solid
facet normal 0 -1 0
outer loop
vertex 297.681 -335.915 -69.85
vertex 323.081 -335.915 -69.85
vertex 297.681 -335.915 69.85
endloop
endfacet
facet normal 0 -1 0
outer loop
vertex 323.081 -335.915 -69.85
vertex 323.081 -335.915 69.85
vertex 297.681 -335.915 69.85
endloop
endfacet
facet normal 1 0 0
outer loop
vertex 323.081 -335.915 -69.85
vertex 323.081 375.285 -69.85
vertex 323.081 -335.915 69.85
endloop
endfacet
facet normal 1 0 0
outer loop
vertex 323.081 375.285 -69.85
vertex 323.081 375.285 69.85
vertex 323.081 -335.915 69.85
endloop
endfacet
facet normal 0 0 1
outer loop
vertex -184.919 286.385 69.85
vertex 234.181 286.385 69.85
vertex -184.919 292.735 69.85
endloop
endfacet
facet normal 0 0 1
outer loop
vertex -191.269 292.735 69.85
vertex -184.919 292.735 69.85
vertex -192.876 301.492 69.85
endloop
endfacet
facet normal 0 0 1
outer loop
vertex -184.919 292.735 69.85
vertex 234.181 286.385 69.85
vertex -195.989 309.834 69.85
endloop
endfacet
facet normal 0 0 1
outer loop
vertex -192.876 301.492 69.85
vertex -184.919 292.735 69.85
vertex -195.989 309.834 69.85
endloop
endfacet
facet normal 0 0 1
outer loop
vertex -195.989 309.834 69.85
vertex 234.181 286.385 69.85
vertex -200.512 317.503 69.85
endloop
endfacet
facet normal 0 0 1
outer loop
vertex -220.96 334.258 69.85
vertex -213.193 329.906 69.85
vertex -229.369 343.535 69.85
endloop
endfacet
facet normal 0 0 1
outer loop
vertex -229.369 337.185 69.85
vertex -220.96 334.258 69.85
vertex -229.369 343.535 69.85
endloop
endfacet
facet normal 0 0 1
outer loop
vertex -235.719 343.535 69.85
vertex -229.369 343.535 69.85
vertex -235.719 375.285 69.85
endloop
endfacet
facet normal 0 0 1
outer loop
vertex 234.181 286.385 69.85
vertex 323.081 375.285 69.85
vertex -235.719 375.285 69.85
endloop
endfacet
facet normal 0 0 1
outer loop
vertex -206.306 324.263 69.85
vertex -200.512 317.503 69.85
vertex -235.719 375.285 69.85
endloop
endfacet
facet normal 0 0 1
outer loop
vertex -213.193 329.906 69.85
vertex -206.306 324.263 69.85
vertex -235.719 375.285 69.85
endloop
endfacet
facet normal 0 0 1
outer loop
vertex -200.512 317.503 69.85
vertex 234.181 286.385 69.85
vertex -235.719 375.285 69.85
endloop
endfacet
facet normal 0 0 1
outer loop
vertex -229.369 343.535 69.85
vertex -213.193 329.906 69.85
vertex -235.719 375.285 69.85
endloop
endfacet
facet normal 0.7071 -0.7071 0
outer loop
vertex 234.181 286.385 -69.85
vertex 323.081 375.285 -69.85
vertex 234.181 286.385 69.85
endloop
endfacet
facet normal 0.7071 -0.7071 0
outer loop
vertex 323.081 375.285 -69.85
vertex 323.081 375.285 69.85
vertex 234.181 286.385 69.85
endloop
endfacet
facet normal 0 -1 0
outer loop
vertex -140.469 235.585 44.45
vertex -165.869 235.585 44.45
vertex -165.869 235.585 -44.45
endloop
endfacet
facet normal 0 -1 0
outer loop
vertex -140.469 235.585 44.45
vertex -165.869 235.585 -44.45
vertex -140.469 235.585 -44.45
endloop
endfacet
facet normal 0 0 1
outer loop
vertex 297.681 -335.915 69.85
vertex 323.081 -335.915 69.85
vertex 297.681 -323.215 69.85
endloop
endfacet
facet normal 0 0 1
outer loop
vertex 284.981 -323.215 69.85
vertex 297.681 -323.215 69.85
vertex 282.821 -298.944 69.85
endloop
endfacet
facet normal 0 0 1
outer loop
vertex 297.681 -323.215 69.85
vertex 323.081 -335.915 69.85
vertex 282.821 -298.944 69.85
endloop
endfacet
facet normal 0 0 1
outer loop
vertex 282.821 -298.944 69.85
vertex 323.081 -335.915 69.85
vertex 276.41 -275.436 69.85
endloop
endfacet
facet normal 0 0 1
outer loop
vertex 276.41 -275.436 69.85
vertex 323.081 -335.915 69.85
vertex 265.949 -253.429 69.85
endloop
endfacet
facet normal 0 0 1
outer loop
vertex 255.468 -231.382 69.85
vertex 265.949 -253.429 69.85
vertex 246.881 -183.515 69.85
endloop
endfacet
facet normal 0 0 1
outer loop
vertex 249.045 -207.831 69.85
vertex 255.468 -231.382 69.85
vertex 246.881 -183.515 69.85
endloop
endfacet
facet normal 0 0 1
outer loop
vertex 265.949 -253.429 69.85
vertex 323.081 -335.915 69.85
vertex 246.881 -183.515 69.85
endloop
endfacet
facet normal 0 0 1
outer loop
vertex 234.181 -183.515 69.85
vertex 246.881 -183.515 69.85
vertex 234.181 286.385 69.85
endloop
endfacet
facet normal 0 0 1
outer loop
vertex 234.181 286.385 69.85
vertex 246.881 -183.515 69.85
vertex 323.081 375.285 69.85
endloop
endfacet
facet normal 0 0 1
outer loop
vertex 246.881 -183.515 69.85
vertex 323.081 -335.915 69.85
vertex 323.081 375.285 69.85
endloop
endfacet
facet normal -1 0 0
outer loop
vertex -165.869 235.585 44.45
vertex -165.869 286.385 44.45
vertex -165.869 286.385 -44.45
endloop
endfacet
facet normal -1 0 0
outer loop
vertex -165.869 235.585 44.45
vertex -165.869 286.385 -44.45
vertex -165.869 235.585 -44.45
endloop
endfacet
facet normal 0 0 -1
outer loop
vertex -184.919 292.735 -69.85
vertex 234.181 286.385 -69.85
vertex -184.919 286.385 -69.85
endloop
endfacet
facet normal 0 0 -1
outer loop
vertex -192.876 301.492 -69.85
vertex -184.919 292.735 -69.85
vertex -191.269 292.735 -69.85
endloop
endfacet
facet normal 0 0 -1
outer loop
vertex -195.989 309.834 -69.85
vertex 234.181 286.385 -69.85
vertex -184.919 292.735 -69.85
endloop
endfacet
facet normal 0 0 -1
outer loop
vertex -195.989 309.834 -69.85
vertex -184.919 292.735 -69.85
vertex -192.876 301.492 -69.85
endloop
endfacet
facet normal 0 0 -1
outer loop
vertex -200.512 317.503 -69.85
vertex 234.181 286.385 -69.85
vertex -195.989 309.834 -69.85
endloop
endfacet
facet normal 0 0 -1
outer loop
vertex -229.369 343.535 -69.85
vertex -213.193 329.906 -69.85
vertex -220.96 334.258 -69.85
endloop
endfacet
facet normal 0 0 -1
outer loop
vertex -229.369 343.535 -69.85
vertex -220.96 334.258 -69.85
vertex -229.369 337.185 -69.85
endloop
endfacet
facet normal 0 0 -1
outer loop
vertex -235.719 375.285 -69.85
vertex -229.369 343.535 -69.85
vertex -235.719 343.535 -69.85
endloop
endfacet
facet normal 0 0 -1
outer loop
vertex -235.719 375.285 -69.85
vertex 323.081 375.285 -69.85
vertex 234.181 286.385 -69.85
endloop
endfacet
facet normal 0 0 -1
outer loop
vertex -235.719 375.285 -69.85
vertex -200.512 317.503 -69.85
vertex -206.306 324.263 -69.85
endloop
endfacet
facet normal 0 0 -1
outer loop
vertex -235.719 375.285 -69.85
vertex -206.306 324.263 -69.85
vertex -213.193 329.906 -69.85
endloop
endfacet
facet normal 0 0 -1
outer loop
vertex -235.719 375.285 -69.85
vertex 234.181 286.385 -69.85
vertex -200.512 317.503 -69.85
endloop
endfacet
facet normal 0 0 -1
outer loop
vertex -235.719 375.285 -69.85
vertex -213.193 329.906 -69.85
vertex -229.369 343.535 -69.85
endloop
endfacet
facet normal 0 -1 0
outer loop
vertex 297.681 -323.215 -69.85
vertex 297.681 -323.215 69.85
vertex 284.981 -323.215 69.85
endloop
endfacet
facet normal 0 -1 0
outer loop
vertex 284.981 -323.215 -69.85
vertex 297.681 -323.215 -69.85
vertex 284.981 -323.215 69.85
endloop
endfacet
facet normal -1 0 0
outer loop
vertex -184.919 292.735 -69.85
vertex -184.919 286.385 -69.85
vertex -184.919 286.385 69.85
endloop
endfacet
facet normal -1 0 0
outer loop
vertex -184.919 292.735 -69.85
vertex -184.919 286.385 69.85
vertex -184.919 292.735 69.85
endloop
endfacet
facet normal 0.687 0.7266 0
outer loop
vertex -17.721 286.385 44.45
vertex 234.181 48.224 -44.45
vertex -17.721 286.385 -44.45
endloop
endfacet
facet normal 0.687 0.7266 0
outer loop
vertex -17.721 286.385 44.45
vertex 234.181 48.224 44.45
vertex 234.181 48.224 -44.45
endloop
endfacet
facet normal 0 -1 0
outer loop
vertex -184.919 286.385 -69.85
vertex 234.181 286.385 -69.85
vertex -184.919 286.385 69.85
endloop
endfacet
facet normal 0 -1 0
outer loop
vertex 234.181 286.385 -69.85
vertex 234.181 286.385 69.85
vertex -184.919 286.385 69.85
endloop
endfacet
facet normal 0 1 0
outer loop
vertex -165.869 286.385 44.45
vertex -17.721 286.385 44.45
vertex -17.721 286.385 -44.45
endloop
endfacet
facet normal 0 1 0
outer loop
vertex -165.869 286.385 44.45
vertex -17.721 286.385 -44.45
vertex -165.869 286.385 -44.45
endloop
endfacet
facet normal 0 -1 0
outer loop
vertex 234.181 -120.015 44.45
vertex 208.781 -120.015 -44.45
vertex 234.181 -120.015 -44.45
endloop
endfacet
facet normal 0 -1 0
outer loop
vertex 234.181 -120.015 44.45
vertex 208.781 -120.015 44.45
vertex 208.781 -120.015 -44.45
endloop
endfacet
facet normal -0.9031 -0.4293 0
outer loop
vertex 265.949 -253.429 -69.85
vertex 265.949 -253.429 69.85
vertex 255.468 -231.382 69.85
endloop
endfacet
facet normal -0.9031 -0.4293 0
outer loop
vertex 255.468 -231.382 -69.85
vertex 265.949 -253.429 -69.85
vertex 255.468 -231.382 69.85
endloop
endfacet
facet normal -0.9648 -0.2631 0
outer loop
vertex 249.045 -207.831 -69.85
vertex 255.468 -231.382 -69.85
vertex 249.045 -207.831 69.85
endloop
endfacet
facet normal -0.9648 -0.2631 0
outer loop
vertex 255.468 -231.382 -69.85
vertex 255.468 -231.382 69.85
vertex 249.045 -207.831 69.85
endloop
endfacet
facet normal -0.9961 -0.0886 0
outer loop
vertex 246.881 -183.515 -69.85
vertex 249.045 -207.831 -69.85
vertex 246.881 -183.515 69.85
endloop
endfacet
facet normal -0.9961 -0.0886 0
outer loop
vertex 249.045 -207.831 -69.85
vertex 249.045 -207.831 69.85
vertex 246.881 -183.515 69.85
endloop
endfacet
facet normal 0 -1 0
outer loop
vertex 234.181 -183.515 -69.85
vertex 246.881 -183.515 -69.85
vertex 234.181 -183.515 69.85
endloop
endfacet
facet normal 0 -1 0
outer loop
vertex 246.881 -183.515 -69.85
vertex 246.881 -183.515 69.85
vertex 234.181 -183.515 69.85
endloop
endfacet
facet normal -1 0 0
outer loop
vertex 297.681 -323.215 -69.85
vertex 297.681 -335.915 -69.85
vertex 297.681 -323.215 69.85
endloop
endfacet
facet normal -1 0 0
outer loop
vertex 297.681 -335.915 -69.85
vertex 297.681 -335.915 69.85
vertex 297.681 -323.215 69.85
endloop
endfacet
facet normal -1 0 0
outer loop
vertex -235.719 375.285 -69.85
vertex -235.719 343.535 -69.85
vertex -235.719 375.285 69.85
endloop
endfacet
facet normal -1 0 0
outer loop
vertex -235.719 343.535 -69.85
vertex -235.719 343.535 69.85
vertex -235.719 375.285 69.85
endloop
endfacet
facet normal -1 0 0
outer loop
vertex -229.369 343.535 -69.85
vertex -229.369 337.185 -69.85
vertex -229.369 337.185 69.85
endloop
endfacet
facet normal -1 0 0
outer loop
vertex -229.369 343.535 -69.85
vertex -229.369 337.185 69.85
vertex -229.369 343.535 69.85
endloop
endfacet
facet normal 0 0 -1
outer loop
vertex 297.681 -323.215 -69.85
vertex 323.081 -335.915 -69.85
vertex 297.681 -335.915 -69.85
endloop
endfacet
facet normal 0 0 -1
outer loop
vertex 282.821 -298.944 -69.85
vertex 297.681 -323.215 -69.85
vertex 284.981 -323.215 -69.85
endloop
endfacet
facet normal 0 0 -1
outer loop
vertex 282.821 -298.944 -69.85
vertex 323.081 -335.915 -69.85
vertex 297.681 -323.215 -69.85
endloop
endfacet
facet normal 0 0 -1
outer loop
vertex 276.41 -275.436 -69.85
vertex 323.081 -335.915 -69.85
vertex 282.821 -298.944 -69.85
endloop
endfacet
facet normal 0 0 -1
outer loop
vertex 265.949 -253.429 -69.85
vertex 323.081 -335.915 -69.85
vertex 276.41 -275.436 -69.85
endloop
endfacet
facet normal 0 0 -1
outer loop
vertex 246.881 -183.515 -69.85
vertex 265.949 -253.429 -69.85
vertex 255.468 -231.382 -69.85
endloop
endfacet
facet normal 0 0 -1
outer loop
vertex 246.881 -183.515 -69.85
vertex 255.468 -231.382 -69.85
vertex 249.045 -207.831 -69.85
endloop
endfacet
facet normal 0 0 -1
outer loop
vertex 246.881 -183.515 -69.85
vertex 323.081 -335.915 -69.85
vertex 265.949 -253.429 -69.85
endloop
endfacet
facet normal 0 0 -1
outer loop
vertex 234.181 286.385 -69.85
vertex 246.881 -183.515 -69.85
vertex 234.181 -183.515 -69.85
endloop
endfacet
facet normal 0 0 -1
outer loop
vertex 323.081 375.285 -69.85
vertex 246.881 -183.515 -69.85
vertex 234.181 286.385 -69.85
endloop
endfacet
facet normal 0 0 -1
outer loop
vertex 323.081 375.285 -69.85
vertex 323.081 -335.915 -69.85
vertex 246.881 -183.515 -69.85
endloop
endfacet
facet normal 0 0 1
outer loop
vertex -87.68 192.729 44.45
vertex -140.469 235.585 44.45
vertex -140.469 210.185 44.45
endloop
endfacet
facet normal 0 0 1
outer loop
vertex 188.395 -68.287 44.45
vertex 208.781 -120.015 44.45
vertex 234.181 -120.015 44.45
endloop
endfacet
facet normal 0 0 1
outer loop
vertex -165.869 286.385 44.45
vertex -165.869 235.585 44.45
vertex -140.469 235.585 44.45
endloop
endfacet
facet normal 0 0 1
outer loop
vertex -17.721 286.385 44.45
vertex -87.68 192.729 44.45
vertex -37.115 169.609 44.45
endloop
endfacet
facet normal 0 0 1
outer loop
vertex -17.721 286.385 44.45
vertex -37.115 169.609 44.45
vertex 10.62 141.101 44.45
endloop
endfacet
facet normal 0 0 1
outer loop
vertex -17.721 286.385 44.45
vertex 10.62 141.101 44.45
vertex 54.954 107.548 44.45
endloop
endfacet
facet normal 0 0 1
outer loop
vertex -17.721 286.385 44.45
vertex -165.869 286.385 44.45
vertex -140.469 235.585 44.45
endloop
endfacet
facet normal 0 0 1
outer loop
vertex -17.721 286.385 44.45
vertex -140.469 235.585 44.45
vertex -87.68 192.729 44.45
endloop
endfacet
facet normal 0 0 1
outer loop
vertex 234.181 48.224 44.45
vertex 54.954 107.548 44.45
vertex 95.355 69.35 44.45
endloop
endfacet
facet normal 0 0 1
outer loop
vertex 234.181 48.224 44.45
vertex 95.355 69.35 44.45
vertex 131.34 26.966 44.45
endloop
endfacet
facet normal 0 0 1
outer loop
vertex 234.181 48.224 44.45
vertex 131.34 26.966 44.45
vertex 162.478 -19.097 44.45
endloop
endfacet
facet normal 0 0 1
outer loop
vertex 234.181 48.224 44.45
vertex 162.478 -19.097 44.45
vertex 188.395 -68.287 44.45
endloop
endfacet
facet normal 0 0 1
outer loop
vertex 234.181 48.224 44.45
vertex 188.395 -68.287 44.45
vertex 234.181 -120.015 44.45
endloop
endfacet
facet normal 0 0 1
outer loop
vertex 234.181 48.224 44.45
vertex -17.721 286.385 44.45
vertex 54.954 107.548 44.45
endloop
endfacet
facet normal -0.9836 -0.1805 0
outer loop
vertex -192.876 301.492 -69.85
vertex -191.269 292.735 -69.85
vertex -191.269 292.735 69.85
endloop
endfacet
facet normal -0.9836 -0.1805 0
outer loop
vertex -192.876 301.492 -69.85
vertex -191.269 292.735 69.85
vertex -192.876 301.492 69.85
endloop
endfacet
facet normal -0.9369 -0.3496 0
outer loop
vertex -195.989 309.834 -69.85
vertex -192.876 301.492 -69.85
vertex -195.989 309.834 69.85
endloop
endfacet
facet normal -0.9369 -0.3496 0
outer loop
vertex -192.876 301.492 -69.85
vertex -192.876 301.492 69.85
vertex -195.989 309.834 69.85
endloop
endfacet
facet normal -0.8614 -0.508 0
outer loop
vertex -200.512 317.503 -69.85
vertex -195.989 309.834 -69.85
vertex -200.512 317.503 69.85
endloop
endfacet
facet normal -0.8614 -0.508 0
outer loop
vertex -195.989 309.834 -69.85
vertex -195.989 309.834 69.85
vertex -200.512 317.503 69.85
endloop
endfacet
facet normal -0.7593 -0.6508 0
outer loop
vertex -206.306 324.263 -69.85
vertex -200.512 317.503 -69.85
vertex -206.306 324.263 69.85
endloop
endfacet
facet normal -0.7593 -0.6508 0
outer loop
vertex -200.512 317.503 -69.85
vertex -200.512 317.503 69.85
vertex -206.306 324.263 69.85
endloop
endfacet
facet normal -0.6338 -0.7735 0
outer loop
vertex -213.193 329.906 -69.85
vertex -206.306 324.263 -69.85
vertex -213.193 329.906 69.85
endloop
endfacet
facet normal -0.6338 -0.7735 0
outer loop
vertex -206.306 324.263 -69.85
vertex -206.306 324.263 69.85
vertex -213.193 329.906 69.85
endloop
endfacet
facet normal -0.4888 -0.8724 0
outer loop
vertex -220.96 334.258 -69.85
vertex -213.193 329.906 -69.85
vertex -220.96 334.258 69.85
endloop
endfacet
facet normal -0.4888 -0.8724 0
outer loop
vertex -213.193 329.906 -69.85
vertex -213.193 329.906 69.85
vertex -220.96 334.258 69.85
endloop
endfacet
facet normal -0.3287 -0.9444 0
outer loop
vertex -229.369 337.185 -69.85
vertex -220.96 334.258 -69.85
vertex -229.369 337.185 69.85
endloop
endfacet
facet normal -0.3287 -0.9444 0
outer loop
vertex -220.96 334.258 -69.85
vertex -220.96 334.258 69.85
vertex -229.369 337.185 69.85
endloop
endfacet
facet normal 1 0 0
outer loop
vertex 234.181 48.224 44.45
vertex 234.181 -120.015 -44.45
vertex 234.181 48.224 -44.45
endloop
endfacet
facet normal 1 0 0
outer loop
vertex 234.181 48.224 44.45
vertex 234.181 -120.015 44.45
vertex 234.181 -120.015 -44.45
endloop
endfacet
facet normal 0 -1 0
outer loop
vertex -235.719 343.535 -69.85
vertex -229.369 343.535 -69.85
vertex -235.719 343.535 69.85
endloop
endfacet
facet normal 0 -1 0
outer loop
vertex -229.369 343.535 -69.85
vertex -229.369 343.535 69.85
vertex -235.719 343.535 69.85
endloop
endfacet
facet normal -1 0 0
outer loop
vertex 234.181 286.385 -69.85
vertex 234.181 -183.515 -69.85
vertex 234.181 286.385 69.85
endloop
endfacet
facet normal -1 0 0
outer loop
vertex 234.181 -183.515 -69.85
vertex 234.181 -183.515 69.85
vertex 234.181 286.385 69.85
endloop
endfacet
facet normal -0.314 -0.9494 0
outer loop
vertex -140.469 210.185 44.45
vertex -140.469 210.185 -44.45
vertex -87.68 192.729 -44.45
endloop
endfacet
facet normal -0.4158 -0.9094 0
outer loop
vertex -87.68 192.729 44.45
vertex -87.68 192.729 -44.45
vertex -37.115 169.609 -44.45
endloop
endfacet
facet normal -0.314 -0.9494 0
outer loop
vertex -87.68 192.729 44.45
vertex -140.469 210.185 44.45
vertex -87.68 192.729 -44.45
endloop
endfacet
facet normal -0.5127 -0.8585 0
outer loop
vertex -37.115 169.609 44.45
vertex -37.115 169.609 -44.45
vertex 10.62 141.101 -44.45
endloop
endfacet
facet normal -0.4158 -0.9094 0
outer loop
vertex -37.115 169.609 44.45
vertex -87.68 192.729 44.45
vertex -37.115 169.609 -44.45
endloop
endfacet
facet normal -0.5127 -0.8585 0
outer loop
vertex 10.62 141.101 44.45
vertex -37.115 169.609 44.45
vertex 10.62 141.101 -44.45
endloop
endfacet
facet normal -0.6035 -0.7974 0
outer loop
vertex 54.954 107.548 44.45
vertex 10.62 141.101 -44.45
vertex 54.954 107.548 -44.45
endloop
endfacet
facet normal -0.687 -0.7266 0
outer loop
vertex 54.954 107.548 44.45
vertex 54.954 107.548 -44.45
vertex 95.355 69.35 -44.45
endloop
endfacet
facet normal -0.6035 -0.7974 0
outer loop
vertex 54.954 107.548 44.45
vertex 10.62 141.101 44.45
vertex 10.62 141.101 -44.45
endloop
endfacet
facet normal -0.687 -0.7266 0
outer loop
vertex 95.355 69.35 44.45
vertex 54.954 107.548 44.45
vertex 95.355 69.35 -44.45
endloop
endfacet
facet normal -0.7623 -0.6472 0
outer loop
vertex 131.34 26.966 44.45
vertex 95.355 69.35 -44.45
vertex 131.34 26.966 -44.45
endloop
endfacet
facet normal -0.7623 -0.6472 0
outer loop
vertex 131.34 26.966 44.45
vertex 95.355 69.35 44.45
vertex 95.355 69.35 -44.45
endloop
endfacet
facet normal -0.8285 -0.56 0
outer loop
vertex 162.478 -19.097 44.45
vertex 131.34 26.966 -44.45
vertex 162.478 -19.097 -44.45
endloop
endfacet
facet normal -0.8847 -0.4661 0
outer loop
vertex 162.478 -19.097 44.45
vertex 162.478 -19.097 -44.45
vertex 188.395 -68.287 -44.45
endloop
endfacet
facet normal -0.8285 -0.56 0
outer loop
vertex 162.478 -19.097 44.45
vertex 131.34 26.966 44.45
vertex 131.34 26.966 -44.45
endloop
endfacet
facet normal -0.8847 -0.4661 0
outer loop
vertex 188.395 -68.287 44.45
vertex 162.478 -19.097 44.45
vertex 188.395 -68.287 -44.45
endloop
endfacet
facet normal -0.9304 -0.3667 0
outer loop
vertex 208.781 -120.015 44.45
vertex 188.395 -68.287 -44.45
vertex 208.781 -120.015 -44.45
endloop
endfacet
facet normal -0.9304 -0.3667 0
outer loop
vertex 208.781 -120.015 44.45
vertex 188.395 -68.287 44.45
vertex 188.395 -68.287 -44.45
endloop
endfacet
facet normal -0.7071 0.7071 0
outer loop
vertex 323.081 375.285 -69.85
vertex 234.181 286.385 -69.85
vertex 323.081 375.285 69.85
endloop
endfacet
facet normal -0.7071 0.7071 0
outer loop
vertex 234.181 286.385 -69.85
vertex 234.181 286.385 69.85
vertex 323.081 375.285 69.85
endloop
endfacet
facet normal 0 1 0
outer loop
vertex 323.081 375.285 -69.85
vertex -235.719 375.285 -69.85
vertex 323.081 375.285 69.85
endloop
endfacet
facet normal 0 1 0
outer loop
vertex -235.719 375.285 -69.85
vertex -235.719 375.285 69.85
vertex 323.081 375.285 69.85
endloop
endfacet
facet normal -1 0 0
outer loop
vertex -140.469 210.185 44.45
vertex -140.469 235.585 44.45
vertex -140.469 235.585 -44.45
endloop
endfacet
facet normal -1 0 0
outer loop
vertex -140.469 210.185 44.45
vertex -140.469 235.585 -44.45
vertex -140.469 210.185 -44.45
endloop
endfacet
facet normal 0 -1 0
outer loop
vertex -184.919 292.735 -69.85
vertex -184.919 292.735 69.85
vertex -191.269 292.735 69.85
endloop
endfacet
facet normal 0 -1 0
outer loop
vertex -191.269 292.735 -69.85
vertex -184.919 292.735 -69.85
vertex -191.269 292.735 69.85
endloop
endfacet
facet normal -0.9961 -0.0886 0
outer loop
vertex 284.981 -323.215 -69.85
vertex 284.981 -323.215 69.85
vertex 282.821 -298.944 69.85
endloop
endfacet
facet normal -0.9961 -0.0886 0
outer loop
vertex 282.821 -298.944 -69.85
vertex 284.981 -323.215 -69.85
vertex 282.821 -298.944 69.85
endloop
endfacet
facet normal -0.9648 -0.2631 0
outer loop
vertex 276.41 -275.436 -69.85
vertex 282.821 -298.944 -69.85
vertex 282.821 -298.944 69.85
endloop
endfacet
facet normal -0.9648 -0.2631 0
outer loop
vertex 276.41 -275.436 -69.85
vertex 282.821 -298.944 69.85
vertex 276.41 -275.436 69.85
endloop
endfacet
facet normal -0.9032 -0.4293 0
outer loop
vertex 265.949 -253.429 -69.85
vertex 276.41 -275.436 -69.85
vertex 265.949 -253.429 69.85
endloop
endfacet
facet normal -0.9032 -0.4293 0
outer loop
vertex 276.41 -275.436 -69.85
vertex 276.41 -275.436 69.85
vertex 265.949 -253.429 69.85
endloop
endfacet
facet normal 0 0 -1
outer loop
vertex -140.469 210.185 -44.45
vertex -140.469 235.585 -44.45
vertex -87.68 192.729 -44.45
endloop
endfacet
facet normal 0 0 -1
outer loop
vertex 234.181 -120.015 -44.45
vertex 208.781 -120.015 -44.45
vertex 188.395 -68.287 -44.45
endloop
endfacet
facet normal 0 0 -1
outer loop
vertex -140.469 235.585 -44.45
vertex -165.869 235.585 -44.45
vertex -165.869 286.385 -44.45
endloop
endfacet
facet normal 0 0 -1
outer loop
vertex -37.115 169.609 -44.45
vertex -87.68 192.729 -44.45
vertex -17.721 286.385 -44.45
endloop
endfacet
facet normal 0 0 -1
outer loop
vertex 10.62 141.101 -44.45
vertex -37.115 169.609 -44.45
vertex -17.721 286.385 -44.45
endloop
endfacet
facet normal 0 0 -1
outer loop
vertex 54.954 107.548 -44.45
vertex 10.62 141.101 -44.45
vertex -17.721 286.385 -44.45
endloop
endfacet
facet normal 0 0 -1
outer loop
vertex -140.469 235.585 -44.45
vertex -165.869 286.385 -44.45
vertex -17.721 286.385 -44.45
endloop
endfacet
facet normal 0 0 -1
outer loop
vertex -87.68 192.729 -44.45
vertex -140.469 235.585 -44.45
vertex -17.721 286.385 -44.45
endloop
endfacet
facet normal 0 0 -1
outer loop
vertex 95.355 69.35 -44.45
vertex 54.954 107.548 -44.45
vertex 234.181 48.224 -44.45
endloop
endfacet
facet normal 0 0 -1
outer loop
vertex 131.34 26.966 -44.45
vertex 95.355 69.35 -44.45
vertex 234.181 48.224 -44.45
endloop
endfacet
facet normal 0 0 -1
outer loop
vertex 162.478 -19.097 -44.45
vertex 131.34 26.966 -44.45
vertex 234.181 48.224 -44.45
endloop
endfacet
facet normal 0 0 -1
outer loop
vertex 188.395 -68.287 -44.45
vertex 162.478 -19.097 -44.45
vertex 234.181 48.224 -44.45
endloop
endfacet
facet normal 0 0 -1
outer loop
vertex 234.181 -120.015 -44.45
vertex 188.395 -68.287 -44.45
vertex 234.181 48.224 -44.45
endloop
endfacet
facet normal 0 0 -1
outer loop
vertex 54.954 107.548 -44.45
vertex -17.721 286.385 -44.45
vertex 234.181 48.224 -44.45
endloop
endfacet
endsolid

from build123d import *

# Parameters (mm, degrees)
BOSS_EXTRUDE1_DEPTH = 69.85
BOSS_EXTRUDE2_DEPTH = 44.45
BOSS_EXTRUDE3_DEPTH = 69.85


with BuildPart() as part:
    # Sketch1 → Boss-Extrude1 (new body, symmetric)
    with BuildSketch(Plane.XY):
        with BuildLine():
            Line((-229.368776984, 337.185), (-229.368776984, 343.535))
            Line((-229.368776984, 343.535), (-235.718776984, 343.535))
            Line((-235.718776984, 343.535), (-235.718776984, 375.285))
            Line((-235.718776984, 375.285), (323.081223016, 375.285))
            Line((323.081223016, 375.285), (234.181223016, 286.385))
            Line((234.181223016, 286.385), (-184.918776984, 286.385))
            Line((-184.918776984, 286.385), (-184.918776984, 292.735))
            Line((-184.918776984, 292.735), (-191.268776984, 292.735))
            ThreePointArc((-191.268776984, 292.735), (-203.260423906, 321.010016924), (-229.368776984, 337.185))
        make_face()
    extrude(amount=BOSS_EXTRUDE1_DEPTH, both=True)


with BuildPart() as body_2:
    # Sketch1_3 → Boss-Extrude2 (new body, symmetric)
    with BuildSketch(Plane.XY):
        with BuildLine():
            Line((234.181223016, 48.22444), (-17.720736984, 286.385))
            Line((-17.720736984, 286.385), (-165.868776984, 286.385))
            Line((-165.868776984, 286.385), (-165.868776984, 235.585))
            Line((-165.868776984, 235.585), (-140.468776984, 235.585))
            Line((-140.468776984, 235.585), (-140.468776984, 210.185))
            ThreePointArc((-140.468776984, 210.185), (75.677544074, 89.001781889), (208.781223016, -120.015))
            Line((208.781223016, -120.015), (234.181223016, -120.015))
            Line((234.181223016, -120.015), (234.181223016, 48.22444))
        make_face()
    extrude(amount=BOSS_EXTRUDE2_DEPTH, both=True)


with BuildPart() as body_3:
    # Sketch1_4 → Boss-Extrude3 (new body, symmetric)
    with BuildSketch(Plane.XY):
        with BuildLine():
            ThreePointArc((265.948759904, -253.429301925), (251.733596793, -219.748894963), (246.881223016, -183.515))
            Line((246.881223016, -183.515), (234.181223016, -183.515))
            Line((234.181223016, -183.515), (234.181223016, 286.385))
            Line((234.181223016, 286.385), (323.081223016, 375.285))
            Line((323.081223016, 375.285), (323.081223016, -335.915))
            Line((323.081223016, -335.915), (297.681223016, -335.915))
            Line((297.681223016, -335.915), (297.681223016, -323.215))
            Line((297.681223016, -323.215), (284.981223016, -323.215))
            ThreePointArc((284.981223016, -323.215), (280.137774937, -287.047755469), (265.948759904, -253.429301925))
        make_face()
    extrude(amount=BOSS_EXTRUDE3_DEPTH, both=True)


solid = Compound([part.part, body_2.part, body_3.part])
